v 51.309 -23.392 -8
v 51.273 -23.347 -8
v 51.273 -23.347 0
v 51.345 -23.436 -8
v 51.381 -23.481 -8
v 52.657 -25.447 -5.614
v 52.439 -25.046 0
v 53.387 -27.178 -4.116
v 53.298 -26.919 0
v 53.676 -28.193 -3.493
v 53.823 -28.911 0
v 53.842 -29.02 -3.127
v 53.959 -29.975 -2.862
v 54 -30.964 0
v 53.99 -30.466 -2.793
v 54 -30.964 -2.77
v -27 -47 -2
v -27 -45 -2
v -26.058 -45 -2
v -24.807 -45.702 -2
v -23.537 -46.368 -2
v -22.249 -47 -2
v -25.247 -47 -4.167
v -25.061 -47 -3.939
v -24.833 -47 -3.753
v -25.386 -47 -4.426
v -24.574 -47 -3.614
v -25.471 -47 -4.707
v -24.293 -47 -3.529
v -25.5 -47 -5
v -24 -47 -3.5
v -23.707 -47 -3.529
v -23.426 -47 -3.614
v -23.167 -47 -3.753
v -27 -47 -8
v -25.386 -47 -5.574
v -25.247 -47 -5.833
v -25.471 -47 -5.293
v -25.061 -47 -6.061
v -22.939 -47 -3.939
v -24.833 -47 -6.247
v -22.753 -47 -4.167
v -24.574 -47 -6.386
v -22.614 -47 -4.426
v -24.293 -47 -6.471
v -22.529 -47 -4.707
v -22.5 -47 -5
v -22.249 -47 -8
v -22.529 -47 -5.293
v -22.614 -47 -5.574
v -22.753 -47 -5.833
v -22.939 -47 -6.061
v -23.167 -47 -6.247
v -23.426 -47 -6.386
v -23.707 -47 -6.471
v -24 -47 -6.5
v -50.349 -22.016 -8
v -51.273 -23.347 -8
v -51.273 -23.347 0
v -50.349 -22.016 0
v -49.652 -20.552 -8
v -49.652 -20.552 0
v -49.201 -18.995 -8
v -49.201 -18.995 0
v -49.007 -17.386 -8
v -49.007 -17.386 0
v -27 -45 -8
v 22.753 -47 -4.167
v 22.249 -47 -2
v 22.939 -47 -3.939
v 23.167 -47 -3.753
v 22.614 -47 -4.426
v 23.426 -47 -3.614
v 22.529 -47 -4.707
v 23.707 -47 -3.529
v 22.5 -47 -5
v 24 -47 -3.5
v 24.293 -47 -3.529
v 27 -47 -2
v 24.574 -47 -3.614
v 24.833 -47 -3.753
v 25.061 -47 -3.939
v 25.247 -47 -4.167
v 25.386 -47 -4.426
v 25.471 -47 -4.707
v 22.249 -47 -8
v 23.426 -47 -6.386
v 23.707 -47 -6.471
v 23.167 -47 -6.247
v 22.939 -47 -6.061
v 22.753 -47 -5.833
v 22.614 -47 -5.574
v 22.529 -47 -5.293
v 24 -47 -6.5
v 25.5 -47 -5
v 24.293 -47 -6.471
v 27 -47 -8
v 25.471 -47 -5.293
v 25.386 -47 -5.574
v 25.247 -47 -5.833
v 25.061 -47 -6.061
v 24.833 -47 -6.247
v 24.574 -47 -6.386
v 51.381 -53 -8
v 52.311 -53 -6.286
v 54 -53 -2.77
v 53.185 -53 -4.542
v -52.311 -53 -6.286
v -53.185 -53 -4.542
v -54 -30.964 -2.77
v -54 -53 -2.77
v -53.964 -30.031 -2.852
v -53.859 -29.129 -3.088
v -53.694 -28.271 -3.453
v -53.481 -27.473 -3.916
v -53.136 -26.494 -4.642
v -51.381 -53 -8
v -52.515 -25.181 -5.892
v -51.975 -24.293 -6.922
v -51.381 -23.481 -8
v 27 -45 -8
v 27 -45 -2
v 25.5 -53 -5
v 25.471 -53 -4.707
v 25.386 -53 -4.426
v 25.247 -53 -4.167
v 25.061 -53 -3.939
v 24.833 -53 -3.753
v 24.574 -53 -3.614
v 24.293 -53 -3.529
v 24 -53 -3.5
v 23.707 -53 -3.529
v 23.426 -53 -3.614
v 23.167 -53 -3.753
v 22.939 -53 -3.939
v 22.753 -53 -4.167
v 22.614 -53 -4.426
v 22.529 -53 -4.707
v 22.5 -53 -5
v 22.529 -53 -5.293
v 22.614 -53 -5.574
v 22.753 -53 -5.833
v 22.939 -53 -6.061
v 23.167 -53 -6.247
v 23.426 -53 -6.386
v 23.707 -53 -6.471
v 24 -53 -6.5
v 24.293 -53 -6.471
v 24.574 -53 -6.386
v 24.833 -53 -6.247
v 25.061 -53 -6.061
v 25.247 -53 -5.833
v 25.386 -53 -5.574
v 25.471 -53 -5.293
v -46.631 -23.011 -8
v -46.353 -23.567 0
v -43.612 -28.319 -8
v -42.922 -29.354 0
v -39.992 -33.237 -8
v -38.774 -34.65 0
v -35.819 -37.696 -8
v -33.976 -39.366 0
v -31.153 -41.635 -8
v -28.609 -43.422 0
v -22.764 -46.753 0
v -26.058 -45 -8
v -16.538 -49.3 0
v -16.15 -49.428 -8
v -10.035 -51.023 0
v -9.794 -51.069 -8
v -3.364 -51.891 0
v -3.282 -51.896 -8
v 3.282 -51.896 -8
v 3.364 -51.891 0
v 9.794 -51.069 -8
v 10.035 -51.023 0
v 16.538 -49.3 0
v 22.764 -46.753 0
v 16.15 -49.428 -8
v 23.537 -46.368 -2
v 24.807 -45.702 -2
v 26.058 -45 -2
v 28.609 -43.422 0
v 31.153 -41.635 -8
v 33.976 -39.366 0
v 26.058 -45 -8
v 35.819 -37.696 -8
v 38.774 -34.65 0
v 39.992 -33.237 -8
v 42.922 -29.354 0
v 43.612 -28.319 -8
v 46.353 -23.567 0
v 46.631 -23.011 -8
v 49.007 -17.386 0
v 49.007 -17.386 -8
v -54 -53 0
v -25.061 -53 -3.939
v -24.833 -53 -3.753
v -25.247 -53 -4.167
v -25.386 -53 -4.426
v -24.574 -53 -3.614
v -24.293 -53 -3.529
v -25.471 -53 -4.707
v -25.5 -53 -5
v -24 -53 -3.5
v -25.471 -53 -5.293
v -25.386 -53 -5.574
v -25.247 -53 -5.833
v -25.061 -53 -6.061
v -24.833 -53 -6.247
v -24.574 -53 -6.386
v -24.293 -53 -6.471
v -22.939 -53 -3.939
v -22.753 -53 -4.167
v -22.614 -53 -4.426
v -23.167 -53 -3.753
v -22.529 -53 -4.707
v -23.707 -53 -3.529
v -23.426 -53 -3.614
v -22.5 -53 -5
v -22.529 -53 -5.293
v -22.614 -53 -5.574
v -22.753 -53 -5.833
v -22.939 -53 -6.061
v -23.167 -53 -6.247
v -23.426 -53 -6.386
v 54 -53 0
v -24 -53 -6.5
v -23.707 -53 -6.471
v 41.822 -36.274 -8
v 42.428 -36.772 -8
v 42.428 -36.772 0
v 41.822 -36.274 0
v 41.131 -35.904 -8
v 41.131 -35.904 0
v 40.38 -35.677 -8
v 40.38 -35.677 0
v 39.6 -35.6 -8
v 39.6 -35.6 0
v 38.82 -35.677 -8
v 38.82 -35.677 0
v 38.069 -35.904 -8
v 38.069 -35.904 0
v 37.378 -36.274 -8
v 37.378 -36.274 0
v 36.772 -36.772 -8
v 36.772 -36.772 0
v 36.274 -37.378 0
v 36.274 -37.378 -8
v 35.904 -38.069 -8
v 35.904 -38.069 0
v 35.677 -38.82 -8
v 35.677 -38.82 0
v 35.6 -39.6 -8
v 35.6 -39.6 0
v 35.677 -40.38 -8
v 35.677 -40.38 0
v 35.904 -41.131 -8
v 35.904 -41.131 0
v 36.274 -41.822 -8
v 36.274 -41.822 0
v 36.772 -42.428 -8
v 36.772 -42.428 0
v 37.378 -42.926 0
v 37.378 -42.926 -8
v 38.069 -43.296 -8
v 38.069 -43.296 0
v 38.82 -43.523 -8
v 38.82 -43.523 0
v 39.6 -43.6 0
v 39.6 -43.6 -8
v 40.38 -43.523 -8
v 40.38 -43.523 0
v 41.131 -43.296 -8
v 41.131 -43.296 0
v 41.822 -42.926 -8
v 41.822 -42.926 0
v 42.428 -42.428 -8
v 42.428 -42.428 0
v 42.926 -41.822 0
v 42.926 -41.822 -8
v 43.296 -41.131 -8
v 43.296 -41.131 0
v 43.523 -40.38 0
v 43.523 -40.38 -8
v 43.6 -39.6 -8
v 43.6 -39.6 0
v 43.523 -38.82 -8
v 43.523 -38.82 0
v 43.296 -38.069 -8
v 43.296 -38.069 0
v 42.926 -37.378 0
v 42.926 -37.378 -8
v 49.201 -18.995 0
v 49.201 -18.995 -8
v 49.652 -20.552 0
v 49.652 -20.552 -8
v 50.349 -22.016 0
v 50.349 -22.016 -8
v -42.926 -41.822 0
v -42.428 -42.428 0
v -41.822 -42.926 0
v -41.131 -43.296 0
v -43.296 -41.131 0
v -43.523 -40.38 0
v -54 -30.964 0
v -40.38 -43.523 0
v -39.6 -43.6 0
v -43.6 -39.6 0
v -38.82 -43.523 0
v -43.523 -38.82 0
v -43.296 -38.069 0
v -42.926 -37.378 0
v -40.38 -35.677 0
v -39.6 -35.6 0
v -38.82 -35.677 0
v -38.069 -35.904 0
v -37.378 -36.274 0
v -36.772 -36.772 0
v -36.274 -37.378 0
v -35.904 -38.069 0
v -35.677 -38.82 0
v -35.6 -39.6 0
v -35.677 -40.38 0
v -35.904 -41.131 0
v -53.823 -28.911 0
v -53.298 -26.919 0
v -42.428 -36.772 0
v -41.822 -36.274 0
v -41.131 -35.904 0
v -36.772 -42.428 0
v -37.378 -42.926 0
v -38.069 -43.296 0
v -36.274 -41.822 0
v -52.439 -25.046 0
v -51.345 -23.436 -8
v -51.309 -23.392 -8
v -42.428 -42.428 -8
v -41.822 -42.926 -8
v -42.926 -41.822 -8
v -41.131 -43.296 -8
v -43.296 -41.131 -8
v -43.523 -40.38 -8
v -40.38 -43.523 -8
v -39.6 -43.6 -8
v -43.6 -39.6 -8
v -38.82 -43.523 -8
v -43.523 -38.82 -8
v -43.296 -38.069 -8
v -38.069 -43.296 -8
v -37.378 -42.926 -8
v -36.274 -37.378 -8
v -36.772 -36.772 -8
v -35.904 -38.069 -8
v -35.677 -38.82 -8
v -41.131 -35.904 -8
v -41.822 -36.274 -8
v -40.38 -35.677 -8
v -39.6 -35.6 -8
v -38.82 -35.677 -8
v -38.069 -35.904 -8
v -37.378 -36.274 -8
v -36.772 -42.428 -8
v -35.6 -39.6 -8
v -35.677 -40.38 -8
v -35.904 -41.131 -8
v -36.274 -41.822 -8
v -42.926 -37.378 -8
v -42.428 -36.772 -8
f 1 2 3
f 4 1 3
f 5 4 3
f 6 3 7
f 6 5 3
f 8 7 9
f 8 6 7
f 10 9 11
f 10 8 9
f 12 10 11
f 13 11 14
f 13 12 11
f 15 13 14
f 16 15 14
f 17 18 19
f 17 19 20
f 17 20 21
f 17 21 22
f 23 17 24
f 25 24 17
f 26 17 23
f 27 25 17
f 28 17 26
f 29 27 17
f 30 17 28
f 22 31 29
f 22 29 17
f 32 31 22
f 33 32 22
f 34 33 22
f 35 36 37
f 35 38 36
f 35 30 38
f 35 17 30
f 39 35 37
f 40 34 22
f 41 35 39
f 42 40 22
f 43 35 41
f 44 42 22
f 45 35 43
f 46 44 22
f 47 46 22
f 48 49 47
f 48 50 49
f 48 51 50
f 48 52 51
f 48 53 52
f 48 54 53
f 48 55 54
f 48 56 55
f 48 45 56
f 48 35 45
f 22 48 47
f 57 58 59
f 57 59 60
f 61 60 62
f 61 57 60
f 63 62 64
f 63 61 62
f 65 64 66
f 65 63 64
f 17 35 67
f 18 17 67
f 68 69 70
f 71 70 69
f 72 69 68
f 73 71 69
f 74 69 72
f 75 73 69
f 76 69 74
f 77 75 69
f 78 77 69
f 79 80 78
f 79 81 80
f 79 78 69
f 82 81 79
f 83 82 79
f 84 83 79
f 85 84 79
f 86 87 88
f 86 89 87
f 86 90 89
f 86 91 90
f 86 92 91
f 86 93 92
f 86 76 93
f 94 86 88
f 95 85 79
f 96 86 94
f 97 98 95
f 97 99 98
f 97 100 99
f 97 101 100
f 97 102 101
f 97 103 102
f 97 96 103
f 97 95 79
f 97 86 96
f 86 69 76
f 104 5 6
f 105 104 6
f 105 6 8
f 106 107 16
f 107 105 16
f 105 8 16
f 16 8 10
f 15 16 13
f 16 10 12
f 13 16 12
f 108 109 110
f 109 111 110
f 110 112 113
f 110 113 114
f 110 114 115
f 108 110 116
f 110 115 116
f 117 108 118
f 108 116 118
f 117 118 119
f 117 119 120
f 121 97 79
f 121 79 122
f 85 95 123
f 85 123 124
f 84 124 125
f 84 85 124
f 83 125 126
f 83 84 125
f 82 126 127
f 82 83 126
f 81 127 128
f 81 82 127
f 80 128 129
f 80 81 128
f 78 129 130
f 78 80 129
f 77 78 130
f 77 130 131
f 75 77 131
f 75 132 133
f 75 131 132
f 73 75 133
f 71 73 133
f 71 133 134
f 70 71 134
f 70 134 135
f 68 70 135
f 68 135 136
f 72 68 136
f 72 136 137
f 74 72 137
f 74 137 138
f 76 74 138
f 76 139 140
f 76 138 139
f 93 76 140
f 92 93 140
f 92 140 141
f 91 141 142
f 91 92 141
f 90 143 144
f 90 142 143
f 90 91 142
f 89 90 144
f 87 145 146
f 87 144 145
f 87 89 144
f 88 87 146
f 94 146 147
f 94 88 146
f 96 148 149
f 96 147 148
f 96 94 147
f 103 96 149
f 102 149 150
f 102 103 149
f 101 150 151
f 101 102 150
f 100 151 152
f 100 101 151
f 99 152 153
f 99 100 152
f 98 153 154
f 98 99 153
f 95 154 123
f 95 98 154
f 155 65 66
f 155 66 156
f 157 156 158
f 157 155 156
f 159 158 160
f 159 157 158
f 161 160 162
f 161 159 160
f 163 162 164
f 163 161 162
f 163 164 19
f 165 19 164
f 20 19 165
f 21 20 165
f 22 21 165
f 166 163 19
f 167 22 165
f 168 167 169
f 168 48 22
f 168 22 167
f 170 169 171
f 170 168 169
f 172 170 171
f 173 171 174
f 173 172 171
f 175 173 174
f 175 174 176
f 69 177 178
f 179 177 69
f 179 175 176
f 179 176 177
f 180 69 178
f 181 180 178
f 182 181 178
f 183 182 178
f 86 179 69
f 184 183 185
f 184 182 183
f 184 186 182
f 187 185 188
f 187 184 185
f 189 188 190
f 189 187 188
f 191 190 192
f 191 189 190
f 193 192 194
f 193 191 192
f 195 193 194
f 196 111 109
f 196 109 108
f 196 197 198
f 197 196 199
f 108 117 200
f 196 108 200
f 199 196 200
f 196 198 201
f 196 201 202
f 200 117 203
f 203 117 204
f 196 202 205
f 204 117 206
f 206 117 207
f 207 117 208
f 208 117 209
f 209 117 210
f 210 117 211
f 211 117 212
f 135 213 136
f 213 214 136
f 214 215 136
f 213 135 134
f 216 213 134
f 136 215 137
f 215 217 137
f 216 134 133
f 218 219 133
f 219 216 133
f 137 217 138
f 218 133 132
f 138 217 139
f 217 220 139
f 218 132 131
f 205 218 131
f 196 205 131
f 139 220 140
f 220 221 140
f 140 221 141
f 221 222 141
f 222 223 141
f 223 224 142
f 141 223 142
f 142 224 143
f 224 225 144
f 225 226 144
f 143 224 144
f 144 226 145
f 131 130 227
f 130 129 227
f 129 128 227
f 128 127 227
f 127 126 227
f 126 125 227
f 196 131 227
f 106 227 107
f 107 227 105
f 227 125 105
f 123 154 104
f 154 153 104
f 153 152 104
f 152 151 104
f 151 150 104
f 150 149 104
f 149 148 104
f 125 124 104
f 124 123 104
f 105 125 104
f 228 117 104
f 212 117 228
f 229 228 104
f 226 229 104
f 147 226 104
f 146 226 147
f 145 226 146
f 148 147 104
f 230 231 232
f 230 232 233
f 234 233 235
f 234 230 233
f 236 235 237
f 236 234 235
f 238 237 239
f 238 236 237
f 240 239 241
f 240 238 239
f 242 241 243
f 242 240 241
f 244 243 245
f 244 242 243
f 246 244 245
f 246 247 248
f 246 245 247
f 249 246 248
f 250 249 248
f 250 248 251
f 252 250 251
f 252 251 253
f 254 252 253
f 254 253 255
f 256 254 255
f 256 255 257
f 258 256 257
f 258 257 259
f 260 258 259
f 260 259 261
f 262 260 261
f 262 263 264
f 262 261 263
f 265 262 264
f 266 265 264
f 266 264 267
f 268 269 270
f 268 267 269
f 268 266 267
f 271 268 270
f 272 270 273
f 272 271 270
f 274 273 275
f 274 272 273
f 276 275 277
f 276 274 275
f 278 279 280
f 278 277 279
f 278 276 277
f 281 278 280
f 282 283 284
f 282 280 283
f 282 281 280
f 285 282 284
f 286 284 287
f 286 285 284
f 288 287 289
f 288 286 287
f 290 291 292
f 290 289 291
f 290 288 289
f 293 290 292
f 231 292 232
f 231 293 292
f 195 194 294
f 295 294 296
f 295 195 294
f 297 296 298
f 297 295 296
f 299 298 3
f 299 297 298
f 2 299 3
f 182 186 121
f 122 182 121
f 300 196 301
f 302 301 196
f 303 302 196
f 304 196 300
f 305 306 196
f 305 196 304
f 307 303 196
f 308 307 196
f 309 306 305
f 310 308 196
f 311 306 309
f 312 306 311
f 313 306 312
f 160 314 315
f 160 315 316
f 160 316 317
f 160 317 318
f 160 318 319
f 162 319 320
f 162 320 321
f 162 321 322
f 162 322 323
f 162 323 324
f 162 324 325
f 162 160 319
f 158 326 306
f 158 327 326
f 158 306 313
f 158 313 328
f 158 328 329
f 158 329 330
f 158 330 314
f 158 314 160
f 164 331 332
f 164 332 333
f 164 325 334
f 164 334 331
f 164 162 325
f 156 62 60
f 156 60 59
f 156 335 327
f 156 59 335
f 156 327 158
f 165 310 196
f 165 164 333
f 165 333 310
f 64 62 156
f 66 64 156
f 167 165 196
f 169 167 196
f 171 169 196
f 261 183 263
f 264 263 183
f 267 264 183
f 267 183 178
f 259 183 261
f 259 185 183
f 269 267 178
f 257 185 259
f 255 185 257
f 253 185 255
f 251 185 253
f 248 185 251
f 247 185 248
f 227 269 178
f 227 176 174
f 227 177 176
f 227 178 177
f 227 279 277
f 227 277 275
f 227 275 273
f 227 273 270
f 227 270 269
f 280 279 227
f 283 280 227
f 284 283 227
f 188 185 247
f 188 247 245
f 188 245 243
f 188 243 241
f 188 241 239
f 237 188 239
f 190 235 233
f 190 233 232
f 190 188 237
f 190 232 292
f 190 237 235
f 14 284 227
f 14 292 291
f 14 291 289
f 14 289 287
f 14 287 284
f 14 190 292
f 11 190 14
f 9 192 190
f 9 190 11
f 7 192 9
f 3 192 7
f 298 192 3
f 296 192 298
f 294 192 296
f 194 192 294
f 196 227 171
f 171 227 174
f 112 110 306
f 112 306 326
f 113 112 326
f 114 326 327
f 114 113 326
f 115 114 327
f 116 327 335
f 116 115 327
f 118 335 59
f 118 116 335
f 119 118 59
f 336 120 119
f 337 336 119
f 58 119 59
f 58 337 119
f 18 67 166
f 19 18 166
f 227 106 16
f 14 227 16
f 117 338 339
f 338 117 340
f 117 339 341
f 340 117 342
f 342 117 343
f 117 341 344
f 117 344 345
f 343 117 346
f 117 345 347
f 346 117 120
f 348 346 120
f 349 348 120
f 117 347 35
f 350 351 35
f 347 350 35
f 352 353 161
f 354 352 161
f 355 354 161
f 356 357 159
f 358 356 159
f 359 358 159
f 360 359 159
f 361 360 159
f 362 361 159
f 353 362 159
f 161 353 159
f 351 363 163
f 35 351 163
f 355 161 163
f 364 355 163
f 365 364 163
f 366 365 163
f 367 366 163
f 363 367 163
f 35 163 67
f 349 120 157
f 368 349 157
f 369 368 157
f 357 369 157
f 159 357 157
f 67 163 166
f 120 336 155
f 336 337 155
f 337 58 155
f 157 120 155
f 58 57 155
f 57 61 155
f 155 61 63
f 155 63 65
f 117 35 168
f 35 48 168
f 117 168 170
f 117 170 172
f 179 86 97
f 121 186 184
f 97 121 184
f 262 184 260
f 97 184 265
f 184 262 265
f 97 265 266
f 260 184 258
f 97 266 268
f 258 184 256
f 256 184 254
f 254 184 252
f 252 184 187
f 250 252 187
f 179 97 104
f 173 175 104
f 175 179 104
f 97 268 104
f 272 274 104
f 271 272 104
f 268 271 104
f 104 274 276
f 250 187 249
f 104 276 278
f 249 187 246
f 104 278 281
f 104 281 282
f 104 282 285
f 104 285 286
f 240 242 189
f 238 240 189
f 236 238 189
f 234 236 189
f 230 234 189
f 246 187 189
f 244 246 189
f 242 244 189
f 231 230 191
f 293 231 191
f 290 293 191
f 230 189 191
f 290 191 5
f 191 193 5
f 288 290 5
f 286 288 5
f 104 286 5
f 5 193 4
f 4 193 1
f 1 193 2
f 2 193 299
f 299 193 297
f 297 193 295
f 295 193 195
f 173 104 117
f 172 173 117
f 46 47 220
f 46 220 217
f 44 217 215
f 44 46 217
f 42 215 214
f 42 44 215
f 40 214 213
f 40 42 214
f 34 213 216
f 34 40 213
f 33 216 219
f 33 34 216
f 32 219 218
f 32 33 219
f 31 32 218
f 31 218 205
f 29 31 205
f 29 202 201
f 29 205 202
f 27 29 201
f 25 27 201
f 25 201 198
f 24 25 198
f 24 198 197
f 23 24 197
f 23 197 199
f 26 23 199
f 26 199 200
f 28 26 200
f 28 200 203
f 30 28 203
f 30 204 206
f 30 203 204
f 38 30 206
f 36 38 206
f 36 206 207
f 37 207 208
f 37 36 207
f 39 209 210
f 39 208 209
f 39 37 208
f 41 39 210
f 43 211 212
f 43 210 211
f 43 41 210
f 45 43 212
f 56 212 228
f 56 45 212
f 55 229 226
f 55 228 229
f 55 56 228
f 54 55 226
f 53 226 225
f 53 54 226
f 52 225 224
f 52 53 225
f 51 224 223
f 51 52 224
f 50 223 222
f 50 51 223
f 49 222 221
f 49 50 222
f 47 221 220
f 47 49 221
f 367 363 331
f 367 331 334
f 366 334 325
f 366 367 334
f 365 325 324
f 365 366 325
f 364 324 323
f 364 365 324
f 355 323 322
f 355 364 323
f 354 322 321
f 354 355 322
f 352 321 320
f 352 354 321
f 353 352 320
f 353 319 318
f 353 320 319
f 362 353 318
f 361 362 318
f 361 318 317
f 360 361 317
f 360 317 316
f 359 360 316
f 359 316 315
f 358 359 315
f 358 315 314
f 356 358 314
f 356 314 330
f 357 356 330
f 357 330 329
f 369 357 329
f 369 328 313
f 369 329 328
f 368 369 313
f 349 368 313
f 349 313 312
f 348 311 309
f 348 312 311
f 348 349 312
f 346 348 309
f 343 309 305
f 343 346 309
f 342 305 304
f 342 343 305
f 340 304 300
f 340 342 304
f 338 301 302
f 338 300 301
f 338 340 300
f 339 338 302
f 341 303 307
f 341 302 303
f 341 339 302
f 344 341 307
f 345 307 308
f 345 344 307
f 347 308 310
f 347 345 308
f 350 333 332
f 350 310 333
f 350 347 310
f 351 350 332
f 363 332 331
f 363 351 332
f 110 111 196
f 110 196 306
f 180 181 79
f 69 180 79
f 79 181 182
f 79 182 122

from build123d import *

# Parameters (mm, degrees)
CYLINDER1328_R               = 59
CYLINDER1328_DEPTH           = 40
CYLINDER1046_R               = 1.5
CYLINDER1046_DEPTH           = 20
CYLINDER1047_R               = 1.5
CYLINDER1047_DEPTH           = 20
CYLINDER1044_R               = 1.5
CYLINDER1044_DEPTH           = 20
CYLINDER1048_R               = 1.5
CYLINDER1048_DEPTH           = 20
BOX435_W                     = 6
BOX435_H                     = 2
BOX435_DEPTH                 = 6
BOX436_W                     = 6
BOX436_H                     = 2
BOX436_DEPTH                 = 6
BOX434_W                     = 6
BOX434_H                     = 2
BOX434_DEPTH                 = 6
BOX437_W                     = 6
BOX437_H                     = 2
BOX437_DEPTH                 = 6
CYLINDER1045_R               = 4
CYLINDER1045_DEPTH           = 20
CYLINDER1045_PLACEMENT_ANGLE = 45
CYLINDER1040_R               = 4
CYLINDER1040_DEPTH           = 20
CYLINDER1040_PLACEMENT_ANGLE = 45
CYLINDER1043_R               = 10
CYLINDER1043_DEPTH           = 40
CYLINDER1041_R               = 10
CYLINDER1041_DEPTH           = 40
CYLINDER1042_R               = 52
CYLINDER1042_DEPTH           = 8
BOX438_W                     = 108
BOX438_H                     = 36
BOX438_DEPTH                 = 8
FILLET016_R                  = 12


with BuildPart() as v_lec1328:
    # Cylinder1328 → Cylinder1328 (new body)
    with BuildSketch(Plane(origin=(0, -17, 21), x_dir=(1, 0, 0), z_dir=(0, -1, 0))):
        Circle(CYLINDER1328_R)
    extrude(amount=CYLINDER1328_DEPTH)


with BuildPart() as v_lec1046:
    # Cylinder1046 → Cylinder1046 (new body)
    with BuildSketch(Plane(origin=(24, -40, -5), x_dir=(1, 0, 0), z_dir=(0, -1, 0))):
        Circle(CYLINDER1046_R)
    extrude(amount=CYLINDER1046_DEPTH)


with BuildPart() as v_lec1047:
    # Cylinder1047 → Cylinder1047 (new body)
    with BuildSketch(Plane(origin=(51, -40, 7), x_dir=(1, 0, 0), z_dir=(0, -1, 0))):
        Circle(CYLINDER1047_R)
    extrude(amount=CYLINDER1047_DEPTH)


with BuildPart() as v_lec1044:
    # Cylinder1044 → Cylinder1044 (new body)
    with BuildSketch(Plane(origin=(-51, -40, 7), x_dir=(1, 0, 0), z_dir=(0, -1, 0))):
        Circle(CYLINDER1044_R)
    extrude(amount=CYLINDER1044_DEPTH)


with BuildPart() as compound827:
    # Cylinder1048 → Cylinder1048 (new body)
    with BuildSketch(Plane(origin=(-24, -40, -5), x_dir=(1, 0, 0), z_dir=(0, -1, 0))):
        Circle(CYLINDER1048_R)
    extrude(amount=CYLINDER1048_DEPTH)

    # Compound827: union Válec1046, Válec1047, Válec1044
    add(v_lec1046.part)
    add(v_lec1047.part)
    add(v_lec1044.part)


with BuildPart() as krychle435:
    # Box435 → Box435 (new body)
    with BuildSketch(Plane(origin=(21, -47, -8), x_dir=(1, 0, 0), z_dir=(0, 0, 1))):
        with Locations((3, 1)):
            Rectangle(BOX435_W, BOX435_H)
    extrude(amount=BOX435_DEPTH)


with BuildPart() as krychle436:
    # Box436 → Box436 (new body)
    with BuildSketch(Plane(origin=(48, -45, 4), x_dir=(1, 0, 0), z_dir=(0, 0, 1))):
        with Locations((3, 1)):
            Rectangle(BOX436_W, BOX436_H)
    extrude(amount=BOX436_DEPTH)


with BuildPart() as krychle434:
    # Box434 → Box434 (new body)
    with BuildSketch(Plane(origin=(-54, -45, 4), x_dir=(1, 0, 0), z_dir=(0, 0, 1))):
        with Locations((3, 1)):
            Rectangle(BOX434_W, BOX434_H)
    extrude(amount=BOX434_DEPTH)


with BuildPart() as compound826:
    # Box437 → Box437 (new body)
    with BuildSketch(Plane(origin=(-27, -47, -8), x_dir=(1, 0, 0), z_dir=(0, 0, 1))):
        with Locations((3, 1)):
            Rectangle(BOX437_W, BOX437_H)
    extrude(amount=BOX437_DEPTH)

    # Compound826: union Krychle435, Krychle436, Krychle434
    add(krychle435.part)
    add(krychle436.part)
    add(krychle434.part)


with BuildPart() as v_lec1045:
    # Cylinder1045 → Cylinder1045 (new body)
    with BuildSketch(Plane.XY):
        Circle(CYLINDER1045_R)
    extrude(amount=CYLINDER1045_DEPTH)


with BuildPart() as v_lec1045_1:
    # Cylinder1045 placement: moved
    add(v_lec1045.part.moved(Location((39.6, -39.6, -10))).rotate(Axis((39.6, -39.6, -10), (0, 0, 1)), CYLINDER1045_PLACEMENT_ANGLE))


with BuildPart() as compound829:
    # Cylinder1040 → Cylinder1040 (new body)
    with BuildSketch(Plane.XY):
        Circle(CYLINDER1040_R)
    extrude(amount=CYLINDER1040_DEPTH)


with BuildPart() as compound829_1:
    # Cylinder1040 placement: moved
    add(compound829.part.moved(Location((-39.6, -39.6, -10))).rotate(Axis((-39.6, -39.6, -10), (0, 0, -1)), CYLINDER1040_PLACEMENT_ANGLE))

    # Compound829: union Válec1045
    add(v_lec1045_1.part)


with BuildPart() as v_lec1043:
    # Cylinder1043 → Cylinder1043 (new body)
    with BuildSketch(Plane(origin=(-59, -17, 0), x_dir=(1, 0, 0), z_dir=(0, 0, 1))):
        Circle(CYLINDER1043_R)
    extrude(amount=CYLINDER1043_DEPTH)


with BuildPart() as compound828:
    # Cylinder1041 → Cylinder1041 (new body)
    with BuildSketch(Plane(origin=(59, -17, 0), x_dir=(1, 0, 0), z_dir=(0, 0, 1))):
        Circle(CYLINDER1041_R)
    extrude(amount=CYLINDER1041_DEPTH)

    # Compound828: union Válec1043
    add(v_lec1043.part)


with BuildPart() as v_lec1042:
    # Cylinder1042 → Cylinder1042 (new body)
    with BuildSketch(Plane.XY.offset(20)):
        Circle(CYLINDER1042_R)
    extrude(amount=CYLINDER1042_DEPTH)


with BuildPart() as common003:
    # Box438 → Box438 (new body)
    with BuildSketch(Plane(origin=(-54, -53, 20), x_dir=(1, 0, 0), z_dir=(0, 0, 1))):
        with Locations((54, 18)):
            Rectangle(BOX438_W, BOX438_H)
    extrude(amount=BOX438_DEPTH)

    # Cut435: cut Válec1042
    add(v_lec1042.part, mode=Mode.SUBTRACT)


with BuildPart() as common003_1:
    # Cut435 placement: moved
    add(common003.part.moved(Location((0, 0, -20))))

    # Cut438: cut Compound828
    add(compound828.part, mode=Mode.SUBTRACT)


with BuildPart() as common003_2:
    # Cut438 placement: moved
    add(common003_1.part.moved(Location((0, 0, -8))))

    # Cut436: cut Compound829
    add(compound829_1.part, mode=Mode.SUBTRACT)

    # Cut437: cut Compound826
    add(compound826.part, mode=Mode.SUBTRACT)

    # Cut434: cut Compound827
    add(compound827.part, mode=Mode.SUBTRACT)

    # Fillet016
    fillet016_edges = [common003_2.edges().sort_by_distance(p)[0] for p in [
        (-54, -25.660254, -4),
        (54, -25.660254, -4),
    ]]
    fillet(fillet016_edges, radius=FILLET016_R)

    # Common003: intersect Válec1328
    add(v_lec1328.part, mode=Mode.INTERSECT)


solid = common003_2.part
